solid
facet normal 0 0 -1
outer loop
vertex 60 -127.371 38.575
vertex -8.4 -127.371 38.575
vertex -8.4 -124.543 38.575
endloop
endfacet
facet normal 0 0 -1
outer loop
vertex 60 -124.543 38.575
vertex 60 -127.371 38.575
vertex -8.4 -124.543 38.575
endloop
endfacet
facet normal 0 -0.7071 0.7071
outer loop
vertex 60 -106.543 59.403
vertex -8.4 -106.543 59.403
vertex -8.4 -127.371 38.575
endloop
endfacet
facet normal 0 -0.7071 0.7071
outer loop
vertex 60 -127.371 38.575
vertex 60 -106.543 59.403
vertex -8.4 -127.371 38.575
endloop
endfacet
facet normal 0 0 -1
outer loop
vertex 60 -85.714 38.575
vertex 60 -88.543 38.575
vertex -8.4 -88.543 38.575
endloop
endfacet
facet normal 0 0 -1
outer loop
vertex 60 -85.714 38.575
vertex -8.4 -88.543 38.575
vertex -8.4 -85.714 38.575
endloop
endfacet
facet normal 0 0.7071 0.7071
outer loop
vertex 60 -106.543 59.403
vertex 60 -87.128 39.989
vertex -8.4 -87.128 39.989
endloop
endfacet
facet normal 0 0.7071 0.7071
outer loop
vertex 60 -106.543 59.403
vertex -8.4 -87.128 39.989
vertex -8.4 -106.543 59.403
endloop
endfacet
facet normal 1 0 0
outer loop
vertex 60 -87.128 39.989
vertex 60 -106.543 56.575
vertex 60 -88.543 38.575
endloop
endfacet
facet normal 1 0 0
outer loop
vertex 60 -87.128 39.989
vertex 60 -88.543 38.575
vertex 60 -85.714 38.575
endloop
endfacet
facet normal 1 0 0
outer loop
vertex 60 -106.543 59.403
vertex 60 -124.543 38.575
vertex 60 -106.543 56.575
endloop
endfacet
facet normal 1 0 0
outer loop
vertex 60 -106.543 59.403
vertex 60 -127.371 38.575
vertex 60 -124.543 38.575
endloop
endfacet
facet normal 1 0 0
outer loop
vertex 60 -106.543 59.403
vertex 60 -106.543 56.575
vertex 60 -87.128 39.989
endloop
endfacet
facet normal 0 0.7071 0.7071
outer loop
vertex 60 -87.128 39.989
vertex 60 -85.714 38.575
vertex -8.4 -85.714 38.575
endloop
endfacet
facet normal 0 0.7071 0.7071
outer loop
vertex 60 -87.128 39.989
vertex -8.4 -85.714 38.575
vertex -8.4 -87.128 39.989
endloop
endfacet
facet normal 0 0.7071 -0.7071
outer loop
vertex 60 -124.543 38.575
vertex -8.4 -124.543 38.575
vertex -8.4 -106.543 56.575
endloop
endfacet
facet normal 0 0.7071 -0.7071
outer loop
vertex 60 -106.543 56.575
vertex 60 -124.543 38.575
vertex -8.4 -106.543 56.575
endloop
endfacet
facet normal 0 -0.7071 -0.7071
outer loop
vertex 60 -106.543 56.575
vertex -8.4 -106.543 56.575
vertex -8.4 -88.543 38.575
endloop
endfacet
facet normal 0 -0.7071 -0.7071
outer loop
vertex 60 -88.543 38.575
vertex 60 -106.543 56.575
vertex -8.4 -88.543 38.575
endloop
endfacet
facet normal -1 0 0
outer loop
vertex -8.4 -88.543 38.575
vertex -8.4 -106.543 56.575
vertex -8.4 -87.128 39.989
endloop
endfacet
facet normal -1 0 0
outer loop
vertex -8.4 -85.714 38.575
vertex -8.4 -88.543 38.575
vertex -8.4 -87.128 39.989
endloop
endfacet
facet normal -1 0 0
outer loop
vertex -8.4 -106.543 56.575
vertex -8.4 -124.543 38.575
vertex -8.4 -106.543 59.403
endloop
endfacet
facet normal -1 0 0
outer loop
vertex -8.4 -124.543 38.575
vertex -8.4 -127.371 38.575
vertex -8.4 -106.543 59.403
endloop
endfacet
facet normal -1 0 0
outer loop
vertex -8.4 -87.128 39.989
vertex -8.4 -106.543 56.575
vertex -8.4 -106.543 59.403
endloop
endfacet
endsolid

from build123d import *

# Parameters (mm, degrees)
F1_DEPTH = 60
F2_DEPTH = 8.4


with BuildPart() as f1:
    # F0 (on Right) → F1 (new body)
    with BuildSketch(Plane.YZ):
        Polygon((-124.5425649285, 38.5748143829), (-106.5425649285, 56.5748143829), (-88.5425649285, 38.5748143829), (-85.7141378038, 38.5748143829), (-87.1283513662, 39.9890279453), (-106.5425649285, 59.4032415077), (-125.9567784909, 39.9890279453), (-127.3709920533, 38.5748143829), align=None)
    extrude(amount=F1_DEPTH)

    # F2 (add): a face of the model
    f2_faces = [f1.faces().sort_by_distance(p)[0] for p in [
        (0, -125.9567784909, 39.0405521721),
    ]]
    extrude(f2_faces, amount=F2_DEPTH)


solid = f1.part
